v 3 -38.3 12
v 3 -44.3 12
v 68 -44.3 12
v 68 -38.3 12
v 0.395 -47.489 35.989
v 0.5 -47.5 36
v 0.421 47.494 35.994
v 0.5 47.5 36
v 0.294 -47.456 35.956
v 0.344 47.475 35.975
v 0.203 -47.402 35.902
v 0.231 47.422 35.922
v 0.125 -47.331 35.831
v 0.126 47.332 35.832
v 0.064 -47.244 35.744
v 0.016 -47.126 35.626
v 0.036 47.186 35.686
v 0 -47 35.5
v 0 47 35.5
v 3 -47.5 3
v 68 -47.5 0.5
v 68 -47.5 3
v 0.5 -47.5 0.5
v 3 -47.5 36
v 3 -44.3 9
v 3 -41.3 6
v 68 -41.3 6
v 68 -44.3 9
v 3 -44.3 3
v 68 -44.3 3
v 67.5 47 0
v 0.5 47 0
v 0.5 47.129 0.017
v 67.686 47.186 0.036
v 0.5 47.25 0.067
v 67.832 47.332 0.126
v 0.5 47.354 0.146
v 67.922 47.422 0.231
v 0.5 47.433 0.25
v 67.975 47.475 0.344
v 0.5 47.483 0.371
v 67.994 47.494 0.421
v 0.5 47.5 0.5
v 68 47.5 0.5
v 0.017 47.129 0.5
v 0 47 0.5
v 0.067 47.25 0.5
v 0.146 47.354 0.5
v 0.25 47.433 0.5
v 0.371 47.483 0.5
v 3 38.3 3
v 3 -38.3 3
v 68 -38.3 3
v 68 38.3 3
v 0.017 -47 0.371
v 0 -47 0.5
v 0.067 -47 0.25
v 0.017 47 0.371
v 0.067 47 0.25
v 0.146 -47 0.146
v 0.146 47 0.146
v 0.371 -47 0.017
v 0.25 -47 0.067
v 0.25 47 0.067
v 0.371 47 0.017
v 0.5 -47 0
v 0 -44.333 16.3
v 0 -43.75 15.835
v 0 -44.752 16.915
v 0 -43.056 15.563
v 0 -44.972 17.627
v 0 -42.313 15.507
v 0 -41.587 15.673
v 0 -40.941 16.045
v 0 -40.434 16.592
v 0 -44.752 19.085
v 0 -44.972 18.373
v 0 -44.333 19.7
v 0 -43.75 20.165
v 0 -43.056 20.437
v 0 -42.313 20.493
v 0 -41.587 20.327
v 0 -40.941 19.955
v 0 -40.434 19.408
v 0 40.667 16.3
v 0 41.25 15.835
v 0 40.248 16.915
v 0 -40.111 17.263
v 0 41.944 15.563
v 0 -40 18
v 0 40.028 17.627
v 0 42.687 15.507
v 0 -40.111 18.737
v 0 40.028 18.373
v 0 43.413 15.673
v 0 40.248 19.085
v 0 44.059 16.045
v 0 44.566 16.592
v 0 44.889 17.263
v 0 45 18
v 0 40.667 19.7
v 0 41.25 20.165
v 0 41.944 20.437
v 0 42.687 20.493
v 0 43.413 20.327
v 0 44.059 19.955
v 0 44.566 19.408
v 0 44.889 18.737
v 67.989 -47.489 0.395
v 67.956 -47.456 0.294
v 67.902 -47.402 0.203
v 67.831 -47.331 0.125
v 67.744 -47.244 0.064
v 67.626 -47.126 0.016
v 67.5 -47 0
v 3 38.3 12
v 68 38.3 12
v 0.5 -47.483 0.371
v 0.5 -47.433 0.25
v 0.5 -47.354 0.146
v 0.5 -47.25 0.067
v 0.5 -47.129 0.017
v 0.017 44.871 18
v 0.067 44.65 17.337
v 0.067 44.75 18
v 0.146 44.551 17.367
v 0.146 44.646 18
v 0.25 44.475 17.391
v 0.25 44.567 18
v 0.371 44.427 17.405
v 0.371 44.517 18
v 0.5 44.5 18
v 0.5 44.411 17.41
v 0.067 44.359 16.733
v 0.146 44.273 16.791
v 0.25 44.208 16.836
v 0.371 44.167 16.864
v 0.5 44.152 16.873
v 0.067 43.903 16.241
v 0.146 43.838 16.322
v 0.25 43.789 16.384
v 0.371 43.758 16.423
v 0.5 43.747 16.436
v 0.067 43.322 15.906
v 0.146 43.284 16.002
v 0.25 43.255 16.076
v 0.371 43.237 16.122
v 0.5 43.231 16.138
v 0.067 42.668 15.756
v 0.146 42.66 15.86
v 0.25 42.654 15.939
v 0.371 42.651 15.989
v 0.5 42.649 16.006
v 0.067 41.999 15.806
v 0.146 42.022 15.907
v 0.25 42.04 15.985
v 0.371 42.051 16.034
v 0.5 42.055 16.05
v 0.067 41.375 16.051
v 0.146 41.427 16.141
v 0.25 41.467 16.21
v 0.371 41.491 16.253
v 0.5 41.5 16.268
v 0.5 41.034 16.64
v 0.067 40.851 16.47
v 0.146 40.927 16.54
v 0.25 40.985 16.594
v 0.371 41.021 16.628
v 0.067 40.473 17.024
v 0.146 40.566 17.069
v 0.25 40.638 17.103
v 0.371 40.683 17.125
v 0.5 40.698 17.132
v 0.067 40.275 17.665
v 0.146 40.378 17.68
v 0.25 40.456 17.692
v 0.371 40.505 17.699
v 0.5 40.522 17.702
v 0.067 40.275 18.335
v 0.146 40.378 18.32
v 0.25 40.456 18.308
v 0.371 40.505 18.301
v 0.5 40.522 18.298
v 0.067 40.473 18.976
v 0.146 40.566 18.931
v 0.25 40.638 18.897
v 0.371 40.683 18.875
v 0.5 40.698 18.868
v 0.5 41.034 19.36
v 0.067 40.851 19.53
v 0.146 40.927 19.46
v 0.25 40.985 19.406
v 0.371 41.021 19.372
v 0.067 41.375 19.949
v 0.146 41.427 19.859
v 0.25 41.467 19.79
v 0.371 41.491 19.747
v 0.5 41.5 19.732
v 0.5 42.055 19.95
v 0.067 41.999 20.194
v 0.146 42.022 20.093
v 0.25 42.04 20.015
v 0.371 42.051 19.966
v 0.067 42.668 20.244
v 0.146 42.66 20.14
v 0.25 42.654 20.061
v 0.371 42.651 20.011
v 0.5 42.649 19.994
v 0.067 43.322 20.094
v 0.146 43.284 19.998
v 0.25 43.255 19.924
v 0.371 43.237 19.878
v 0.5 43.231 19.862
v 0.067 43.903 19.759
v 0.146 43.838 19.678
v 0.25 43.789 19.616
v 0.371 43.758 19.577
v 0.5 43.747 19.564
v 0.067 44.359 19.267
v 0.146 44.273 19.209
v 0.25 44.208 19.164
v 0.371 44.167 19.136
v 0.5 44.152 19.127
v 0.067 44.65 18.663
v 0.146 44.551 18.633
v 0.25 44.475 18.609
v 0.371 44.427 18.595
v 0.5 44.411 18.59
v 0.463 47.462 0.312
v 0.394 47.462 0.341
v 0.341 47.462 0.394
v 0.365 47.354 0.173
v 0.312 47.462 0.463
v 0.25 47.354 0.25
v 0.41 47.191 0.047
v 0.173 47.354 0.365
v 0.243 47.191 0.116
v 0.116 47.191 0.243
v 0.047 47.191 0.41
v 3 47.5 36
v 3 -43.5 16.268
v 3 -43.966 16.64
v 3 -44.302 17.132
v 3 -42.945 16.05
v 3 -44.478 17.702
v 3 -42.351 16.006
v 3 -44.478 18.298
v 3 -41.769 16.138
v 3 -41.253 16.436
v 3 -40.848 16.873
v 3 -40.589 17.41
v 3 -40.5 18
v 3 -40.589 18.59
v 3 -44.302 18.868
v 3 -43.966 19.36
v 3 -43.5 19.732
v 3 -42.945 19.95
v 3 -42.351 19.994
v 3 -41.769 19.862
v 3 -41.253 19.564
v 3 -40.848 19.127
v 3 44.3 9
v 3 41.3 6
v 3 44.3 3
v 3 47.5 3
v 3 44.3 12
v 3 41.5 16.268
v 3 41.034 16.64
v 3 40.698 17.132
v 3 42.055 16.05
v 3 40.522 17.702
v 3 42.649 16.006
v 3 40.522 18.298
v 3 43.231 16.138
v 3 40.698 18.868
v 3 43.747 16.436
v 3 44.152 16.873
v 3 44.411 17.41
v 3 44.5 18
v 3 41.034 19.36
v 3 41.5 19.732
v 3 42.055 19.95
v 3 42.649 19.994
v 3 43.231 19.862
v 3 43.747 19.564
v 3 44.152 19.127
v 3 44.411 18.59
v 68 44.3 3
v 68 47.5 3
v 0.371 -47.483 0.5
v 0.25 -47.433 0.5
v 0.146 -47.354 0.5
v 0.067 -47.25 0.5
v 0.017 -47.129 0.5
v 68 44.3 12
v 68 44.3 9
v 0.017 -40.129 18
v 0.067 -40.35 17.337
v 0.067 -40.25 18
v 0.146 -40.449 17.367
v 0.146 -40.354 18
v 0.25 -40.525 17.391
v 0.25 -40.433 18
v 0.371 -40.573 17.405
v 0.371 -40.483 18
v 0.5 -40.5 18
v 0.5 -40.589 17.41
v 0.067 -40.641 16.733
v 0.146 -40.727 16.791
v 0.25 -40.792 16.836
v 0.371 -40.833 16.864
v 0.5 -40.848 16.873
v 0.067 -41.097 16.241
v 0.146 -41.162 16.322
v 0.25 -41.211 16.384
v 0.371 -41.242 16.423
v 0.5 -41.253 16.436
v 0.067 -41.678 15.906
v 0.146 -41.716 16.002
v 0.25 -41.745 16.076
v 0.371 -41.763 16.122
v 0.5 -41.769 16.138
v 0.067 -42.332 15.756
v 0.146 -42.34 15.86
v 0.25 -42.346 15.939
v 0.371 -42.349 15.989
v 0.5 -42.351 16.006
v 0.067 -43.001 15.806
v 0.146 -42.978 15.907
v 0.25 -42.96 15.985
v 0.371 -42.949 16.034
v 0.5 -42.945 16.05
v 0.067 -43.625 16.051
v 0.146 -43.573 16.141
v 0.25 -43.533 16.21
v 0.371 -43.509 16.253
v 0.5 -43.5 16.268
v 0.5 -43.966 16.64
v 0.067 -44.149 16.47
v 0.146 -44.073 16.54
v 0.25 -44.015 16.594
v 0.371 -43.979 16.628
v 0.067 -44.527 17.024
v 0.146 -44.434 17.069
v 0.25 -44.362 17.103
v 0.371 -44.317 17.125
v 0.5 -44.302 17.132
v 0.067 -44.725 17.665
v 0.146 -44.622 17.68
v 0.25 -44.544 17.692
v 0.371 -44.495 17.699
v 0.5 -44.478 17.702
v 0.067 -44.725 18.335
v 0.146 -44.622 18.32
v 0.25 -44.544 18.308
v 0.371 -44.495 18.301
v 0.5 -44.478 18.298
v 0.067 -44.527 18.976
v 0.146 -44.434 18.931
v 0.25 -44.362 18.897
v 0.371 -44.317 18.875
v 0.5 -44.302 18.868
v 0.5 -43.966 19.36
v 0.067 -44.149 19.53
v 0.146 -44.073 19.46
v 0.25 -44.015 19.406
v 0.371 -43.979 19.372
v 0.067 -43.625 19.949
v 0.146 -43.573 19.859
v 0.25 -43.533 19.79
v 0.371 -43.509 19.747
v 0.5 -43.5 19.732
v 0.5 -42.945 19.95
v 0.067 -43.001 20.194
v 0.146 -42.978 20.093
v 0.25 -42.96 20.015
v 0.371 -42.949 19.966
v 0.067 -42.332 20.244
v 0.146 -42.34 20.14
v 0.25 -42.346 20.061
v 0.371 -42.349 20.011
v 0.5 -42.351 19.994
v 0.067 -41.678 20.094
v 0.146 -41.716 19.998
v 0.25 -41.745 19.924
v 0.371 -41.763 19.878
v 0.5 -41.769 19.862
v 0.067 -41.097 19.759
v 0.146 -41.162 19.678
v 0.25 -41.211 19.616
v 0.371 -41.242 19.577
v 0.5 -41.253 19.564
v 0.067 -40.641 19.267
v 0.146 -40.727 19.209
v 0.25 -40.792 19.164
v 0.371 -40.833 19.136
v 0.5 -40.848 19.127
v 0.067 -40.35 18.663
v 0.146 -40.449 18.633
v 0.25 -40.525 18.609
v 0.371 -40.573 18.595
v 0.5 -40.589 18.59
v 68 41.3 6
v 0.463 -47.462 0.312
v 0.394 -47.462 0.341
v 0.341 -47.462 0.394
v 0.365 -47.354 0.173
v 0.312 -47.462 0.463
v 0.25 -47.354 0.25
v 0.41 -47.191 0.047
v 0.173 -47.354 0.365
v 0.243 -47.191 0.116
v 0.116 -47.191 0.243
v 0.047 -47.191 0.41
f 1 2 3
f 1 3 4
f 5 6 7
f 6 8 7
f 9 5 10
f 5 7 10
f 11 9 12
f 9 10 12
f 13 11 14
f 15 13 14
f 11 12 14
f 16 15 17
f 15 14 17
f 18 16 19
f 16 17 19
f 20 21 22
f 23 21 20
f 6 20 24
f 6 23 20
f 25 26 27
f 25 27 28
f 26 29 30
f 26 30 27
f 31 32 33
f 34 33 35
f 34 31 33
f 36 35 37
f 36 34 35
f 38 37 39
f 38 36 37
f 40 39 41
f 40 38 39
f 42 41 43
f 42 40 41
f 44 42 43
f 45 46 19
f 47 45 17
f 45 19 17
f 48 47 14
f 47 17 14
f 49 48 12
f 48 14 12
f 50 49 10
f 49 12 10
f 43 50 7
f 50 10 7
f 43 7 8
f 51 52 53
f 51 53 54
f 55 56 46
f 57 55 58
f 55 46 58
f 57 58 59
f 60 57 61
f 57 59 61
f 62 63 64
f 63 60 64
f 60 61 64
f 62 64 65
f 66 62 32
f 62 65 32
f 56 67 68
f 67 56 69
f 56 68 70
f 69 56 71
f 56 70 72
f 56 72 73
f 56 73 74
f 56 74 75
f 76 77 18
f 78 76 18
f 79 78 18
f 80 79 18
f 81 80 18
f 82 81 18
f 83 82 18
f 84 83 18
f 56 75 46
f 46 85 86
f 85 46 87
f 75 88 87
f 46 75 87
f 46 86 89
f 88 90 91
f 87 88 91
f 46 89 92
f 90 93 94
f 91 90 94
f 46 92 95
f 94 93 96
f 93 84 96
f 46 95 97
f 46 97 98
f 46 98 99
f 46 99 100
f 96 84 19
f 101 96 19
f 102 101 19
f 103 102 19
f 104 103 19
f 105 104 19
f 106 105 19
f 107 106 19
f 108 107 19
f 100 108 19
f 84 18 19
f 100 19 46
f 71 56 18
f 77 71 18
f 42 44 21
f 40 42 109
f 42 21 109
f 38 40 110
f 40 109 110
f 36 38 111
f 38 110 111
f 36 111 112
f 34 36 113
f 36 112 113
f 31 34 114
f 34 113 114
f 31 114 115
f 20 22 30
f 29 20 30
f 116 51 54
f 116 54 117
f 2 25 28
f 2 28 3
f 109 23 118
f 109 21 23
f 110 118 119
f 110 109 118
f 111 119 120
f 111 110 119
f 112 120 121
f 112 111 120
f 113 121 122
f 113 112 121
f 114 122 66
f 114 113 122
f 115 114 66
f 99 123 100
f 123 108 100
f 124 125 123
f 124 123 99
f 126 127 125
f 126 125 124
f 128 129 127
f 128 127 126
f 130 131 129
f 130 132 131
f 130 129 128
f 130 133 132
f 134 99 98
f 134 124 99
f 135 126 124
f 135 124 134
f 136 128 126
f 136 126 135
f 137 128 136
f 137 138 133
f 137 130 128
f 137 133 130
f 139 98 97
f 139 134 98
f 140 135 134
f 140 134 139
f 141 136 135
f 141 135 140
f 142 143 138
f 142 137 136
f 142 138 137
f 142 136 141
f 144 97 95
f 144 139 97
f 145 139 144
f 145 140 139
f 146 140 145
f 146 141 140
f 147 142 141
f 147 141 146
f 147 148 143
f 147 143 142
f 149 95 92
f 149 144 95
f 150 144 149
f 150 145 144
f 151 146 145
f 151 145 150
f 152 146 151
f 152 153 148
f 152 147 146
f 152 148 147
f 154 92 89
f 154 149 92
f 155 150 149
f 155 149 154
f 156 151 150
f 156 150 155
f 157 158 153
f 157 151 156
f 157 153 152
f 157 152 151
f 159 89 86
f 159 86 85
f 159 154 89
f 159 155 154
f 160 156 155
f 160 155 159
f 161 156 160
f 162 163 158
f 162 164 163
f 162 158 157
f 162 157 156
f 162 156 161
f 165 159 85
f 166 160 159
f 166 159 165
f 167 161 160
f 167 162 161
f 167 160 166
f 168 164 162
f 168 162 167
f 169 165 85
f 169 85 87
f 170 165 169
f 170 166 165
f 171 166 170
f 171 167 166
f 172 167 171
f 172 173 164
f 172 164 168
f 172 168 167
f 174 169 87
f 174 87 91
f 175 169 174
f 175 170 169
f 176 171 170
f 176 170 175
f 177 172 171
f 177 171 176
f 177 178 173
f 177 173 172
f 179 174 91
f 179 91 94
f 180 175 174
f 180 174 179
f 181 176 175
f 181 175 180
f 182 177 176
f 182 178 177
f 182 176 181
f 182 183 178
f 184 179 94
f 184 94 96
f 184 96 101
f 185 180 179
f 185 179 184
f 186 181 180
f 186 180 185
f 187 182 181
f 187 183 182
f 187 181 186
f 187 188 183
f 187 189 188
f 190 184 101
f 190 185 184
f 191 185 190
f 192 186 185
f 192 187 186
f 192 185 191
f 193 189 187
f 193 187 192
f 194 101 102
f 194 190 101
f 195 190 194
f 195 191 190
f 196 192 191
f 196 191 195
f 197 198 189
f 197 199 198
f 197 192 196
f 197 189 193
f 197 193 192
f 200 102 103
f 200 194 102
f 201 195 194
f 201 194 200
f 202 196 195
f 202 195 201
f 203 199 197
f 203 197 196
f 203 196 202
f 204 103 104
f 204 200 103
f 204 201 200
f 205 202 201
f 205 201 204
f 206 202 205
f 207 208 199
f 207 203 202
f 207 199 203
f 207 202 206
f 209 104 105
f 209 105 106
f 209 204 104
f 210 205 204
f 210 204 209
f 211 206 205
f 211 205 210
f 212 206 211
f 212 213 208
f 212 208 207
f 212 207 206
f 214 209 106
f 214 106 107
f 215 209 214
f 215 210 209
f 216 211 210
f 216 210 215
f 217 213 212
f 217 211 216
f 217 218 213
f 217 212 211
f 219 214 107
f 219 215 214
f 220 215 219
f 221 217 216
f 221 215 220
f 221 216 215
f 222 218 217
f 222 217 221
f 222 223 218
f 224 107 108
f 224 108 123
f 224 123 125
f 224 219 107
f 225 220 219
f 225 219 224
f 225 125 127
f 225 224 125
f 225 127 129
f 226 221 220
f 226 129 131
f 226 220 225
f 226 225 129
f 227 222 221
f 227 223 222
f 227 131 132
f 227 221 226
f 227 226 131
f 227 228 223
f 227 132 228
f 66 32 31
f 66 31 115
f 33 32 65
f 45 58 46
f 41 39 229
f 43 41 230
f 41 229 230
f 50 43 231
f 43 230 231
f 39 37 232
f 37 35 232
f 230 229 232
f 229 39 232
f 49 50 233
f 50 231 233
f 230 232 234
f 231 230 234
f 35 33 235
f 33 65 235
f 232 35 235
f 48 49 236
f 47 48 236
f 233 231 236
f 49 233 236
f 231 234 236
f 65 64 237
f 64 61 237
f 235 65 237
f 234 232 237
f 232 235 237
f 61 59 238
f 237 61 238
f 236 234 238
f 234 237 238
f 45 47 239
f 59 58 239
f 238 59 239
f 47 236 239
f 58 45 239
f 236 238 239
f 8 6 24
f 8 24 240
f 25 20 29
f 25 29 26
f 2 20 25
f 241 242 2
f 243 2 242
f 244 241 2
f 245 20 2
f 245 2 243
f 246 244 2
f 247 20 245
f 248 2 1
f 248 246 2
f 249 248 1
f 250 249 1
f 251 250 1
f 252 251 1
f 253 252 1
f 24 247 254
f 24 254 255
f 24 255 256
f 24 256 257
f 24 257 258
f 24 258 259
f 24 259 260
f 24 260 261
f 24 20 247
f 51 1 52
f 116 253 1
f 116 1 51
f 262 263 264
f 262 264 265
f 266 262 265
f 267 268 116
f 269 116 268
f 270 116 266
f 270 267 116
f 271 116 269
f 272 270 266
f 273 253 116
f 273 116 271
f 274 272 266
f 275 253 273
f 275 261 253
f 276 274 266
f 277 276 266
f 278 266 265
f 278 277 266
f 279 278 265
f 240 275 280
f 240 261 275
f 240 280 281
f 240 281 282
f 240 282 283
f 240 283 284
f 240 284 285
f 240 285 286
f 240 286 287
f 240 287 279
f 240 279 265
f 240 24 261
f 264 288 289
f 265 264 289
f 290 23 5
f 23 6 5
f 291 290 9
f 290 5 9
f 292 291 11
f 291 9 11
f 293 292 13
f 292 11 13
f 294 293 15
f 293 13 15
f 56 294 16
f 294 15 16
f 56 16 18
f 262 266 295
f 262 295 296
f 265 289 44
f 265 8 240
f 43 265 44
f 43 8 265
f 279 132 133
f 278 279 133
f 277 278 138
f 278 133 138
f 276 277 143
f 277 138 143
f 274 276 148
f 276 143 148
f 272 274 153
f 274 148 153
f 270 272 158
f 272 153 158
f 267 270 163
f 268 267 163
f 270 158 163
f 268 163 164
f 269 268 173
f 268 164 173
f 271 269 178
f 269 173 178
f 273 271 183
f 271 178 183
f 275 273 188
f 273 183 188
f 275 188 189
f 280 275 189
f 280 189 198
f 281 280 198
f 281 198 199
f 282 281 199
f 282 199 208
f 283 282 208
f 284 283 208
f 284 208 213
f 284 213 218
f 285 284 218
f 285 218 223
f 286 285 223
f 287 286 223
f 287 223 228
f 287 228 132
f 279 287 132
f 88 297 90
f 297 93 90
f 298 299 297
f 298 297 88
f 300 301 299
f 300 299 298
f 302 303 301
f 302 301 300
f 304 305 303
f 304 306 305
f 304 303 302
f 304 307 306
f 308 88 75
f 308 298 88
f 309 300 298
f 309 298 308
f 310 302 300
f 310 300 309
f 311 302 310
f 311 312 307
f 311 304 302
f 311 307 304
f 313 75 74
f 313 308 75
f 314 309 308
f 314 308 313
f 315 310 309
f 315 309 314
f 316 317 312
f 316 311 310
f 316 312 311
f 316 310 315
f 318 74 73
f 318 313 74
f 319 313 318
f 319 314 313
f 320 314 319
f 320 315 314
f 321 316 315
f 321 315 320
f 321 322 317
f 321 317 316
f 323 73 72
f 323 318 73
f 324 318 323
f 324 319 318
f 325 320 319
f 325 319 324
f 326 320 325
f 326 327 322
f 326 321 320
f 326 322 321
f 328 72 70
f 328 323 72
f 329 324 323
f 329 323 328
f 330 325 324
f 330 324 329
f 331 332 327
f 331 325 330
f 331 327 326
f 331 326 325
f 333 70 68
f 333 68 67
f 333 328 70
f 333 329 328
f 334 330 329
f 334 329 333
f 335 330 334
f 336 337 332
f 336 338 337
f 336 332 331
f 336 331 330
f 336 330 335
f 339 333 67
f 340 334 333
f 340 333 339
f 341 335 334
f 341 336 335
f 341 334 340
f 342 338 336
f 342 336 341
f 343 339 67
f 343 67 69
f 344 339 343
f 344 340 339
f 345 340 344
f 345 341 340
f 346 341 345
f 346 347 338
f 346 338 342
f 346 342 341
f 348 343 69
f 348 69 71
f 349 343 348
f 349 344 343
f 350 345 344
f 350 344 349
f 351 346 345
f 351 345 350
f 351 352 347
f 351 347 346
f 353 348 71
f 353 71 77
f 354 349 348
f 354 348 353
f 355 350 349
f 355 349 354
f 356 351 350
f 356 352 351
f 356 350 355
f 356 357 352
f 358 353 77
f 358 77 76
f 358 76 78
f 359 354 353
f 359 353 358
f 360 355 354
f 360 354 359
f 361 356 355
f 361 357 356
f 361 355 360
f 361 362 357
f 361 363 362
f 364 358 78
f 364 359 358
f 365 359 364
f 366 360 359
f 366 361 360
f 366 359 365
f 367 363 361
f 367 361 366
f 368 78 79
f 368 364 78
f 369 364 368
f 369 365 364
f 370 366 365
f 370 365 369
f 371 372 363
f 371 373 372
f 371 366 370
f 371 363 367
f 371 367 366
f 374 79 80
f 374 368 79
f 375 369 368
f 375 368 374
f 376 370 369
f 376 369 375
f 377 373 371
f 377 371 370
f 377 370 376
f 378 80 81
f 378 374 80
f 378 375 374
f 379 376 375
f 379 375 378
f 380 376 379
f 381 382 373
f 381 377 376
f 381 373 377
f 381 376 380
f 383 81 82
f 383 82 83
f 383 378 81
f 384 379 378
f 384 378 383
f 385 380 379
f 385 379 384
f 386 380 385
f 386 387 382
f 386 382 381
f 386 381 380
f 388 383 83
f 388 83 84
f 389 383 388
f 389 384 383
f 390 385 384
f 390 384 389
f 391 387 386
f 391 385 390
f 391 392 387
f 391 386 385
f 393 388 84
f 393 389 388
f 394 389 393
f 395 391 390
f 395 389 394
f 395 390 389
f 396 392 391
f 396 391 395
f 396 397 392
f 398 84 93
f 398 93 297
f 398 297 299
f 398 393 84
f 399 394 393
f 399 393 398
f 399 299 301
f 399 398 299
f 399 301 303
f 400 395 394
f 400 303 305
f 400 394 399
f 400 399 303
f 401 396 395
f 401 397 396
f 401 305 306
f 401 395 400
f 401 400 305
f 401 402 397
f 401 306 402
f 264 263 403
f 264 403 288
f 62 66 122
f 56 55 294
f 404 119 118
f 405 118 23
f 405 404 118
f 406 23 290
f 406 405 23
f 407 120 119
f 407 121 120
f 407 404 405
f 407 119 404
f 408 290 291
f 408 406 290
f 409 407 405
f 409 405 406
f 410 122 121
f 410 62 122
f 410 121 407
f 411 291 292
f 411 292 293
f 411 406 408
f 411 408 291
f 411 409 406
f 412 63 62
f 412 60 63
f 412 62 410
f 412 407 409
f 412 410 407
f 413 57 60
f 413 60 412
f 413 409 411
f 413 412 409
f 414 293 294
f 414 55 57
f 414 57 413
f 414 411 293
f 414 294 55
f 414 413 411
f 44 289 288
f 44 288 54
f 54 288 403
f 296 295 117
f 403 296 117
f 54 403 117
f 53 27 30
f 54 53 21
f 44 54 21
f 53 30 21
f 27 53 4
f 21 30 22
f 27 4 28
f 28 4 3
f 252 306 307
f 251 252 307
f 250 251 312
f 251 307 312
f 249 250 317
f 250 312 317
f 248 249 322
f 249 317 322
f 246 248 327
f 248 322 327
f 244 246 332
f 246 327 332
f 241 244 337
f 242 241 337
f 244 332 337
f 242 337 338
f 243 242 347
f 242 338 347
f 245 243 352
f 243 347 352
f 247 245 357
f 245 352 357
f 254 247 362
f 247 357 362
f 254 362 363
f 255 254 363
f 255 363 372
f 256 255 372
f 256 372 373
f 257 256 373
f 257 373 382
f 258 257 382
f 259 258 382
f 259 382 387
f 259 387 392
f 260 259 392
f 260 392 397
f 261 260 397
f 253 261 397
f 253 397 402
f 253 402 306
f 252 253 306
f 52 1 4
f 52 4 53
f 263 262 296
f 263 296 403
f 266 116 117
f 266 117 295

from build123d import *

# Parameters (mm, degrees)
SKETCH_W     = 95
SKETCH_H     = 36
PAD_DEPTH    = 3
PAD001_DEPTH = 65
SKETCH002_R  = 2
POCKET_DEPTH = 68.001
FILLET_R     = 0.5


with BuildPart() as part:
    # Sketch → Pad (new body)
    with BuildSketch(Plane.YZ):
        with Locations((0, 18)):
            Rectangle(SKETCH_W, SKETCH_H)
    extrude(amount=PAD_DEPTH)

    # Sketch001 (on Face6 of Pad) → Pad001 (join)
    with BuildSketch(Plane.YZ.offset(3)):
        Polygon((-47.5, 0), (-47.5, 3), (-44.3, 3), (-41.3, 6), (-44.3, 9), (-44.3, 12), (-38.3, 12), (-38.3, 3), (38.3, 3), (38.3, 12), (44.3, 12), (44.3, 9), (41.3, 6), (44.3, 3), (47.5, 3), (47.5, 0), align=None)
    extrude(amount=PAD001_DEPTH)

    # Sketch002 (on Face1 of Pad001) → Pocket (cut, through all)
    with BuildSketch(Plane(origin=(0, 0, 0), x_dir=(0, 1, 0), z_dir=(-1, 0, 0))):
        with Locations((-42.5, -18)):
            Circle(SKETCH002_R)
        with Locations((42.5, -18)):
            Circle(SKETCH002_R)
    extrude(amount=-POCKET_DEPTH, mode=Mode.SUBTRACT)

    # Fillet
    fillet_edges = [part.edges().sort_by_distance(p)[0] for p in [
        (0, 0, 0),
        (34, 47.5, 0),
        (68, 0, 0),
        (34, -47.5, 0),
        (0, -47.5, 18),
        (0, 47.5, 18),
        (0, 0, 36),
        (0, 40.5, 18),
        (0, -44.5, 18),
    ]]
    fillet(fillet_edges, radius=FILLET_R)


solid = part.part
